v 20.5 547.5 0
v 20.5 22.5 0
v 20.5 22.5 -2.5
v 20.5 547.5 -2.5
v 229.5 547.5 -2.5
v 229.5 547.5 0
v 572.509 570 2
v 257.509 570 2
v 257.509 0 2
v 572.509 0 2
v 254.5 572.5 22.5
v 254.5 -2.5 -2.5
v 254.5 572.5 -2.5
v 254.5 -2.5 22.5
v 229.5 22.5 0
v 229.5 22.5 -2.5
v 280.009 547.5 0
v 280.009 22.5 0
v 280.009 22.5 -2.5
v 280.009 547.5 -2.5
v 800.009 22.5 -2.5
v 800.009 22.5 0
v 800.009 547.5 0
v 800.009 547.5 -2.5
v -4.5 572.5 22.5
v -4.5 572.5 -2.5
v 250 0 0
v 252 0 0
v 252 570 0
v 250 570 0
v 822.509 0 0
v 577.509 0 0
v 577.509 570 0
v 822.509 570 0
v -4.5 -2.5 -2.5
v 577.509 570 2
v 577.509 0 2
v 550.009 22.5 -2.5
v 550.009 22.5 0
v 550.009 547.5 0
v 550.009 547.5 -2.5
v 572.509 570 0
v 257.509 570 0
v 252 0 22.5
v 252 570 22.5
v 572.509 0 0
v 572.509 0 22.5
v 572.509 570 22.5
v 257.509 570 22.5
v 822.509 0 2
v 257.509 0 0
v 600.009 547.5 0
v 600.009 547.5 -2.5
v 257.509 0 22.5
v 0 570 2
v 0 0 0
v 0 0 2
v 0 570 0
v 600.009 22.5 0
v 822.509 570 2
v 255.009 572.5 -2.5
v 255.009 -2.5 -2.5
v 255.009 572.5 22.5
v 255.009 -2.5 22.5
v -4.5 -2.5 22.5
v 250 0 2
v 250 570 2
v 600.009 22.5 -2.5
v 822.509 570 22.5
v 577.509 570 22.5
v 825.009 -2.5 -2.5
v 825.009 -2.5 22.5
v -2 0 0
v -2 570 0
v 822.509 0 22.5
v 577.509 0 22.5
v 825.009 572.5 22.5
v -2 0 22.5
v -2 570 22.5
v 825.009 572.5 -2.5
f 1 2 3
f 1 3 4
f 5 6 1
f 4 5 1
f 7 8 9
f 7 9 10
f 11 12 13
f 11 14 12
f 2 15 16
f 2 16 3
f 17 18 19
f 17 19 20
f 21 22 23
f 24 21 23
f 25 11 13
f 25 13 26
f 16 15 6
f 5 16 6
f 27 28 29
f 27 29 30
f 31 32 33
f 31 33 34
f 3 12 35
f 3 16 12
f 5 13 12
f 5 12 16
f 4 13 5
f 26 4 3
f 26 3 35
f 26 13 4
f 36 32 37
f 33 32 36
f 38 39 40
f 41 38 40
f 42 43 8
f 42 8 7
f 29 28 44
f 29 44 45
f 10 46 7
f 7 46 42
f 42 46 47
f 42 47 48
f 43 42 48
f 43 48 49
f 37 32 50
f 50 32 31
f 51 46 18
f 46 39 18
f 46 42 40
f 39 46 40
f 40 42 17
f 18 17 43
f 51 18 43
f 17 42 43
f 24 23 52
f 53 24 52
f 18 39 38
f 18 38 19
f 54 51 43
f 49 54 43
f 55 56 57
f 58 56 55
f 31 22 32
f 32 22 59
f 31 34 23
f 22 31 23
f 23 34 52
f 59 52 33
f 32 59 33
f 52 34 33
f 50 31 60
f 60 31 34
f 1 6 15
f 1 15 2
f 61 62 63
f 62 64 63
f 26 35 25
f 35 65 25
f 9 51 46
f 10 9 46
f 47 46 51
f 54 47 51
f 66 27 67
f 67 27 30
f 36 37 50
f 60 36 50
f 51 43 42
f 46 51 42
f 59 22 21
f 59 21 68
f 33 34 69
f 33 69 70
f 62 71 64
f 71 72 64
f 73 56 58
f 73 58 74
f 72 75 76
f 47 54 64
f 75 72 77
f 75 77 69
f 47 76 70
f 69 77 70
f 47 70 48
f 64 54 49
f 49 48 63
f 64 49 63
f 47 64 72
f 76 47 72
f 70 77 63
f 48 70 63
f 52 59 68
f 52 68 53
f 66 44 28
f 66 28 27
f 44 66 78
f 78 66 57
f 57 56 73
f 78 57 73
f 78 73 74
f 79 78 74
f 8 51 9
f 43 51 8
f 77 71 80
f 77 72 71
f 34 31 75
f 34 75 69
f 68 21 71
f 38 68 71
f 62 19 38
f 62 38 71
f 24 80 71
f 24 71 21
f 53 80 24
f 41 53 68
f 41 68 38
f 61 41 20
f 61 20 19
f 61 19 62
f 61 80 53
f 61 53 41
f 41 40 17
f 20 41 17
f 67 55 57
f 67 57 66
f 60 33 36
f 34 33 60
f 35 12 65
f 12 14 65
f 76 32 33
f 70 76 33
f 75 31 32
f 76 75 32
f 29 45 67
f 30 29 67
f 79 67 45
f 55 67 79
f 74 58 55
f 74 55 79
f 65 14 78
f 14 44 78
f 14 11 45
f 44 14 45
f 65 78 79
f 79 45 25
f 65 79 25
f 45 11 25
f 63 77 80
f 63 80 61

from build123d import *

# Parameters (mm, degrees)
ESQUISSE1_W         = 250
ESQUISSE1_H         = 570
BOSS_EXTRU_2_DEPTH  = 2
ESQUISSE11_W        = 259
ESQUISSE11_H        = 575
ESQUISSE11_W_2      = 254
ESQUISSE11_H_2      = 570
BOSS_EXTRU_12_DEPTH = 22.5
ESQUISSE12_W        = 259
ESQUISSE12_H        = 575
ESQUISSE12_W_2      = 209
ESQUISSE12_H_2      = 525
BOSS_EXTRU_13_DEPTH = 2.5
ESQUISSE13_W        = 320
ESQUISSE13_H        = 575
ESQUISSE13_W_2      = 315
ESQUISSE13_H_2      = 570
BOSS_EXTRU_14_DEPTH = 22.5
ESQUISSE14_W        = 320
ESQUISSE14_H        = 575
ESQUISSE14_W_2      = 270
ESQUISSE14_H_2      = 525
BOSS_EXTRU_15_DEPTH = 2.5
ESQUISSE15_W        = 315
ESQUISSE15_H        = 570
BOSS_EXTRU_16_DEPTH = 2
ESQUISSE18_W        = 250
ESQUISSE18_H        = 575
ESQUISSE18_W_2      = 245
ESQUISSE18_H_2      = 570
BOSS_EXTRU_19_DEPTH = 22.5
ESQUISSE19_W        = 250
ESQUISSE19_H        = 575
ESQUISSE19_W_2      = 200
ESQUISSE19_H_2      = 525
BOSS_EXTRU_20_DEPTH = 2.5
ESQUISSE20_W        = 245
ESQUISSE20_H        = 570
BOSS_EXTRU_21_DEPTH = 2


with BuildPart() as part:
    # Esquisse1 → Boss.-Extru.2 (new body)
    with BuildSketch(Plane.XY):
        with Locations((125, 285)):
            Rectangle(ESQUISSE1_W, ESQUISSE1_H)
    extrude(amount=BOSS_EXTRU_2_DEPTH)



with BuildPart() as body_2:
    # Esquisse11 → Boss.-Extru.12 (new body)
    with BuildSketch(Plane(origin=(0, 0, 0), x_dir=(-1, 0, 0), z_dir=(0, 0, -1))):
        with Locations((-125, 285)):
            Rectangle(ESQUISSE11_W, ESQUISSE11_H)
        with Locations((-125, 285)):
            Rectangle(ESQUISSE11_W_2, ESQUISSE11_H_2, mode=Mode.SUBTRACT)
    extrude(amount=-BOSS_EXTRU_12_DEPTH)


with BuildPart() as part_1:
    add(part.part)

    add(body_2.part)  # Boss.-Extru.13 merges body 2
    # Esquisse12 → Boss.-Extru.13 (add)
    with BuildSketch(Plane(origin=(0, 0, 0), x_dir=(-1, 0, 0), z_dir=(0, 0, -1))):
        with Locations((-125, 285)):
            Rectangle(ESQUISSE12_W, ESQUISSE12_H)
        with Locations((-125, 285)):
            Rectangle(ESQUISSE12_W_2, ESQUISSE12_H_2, mode=Mode.SUBTRACT)
    extrude(amount=BOSS_EXTRU_13_DEPTH)


with BuildPart() as body_2_2:
    # Esquisse13 → Boss.-Extru.14 (new body)
    with BuildSketch(Plane(origin=(0, 0, 0), x_dir=(-1, 0, 0), z_dir=(0, 0, -1))):
        with Locations((-415.009332024, 285)):
            Rectangle(ESQUISSE13_W, ESQUISSE13_H)
        with Locations((-415.009332024, 285)):
            Rectangle(ESQUISSE13_W_2, ESQUISSE13_H_2, mode=Mode.SUBTRACT)
    extrude(amount=-BOSS_EXTRU_14_DEPTH)

    # Esquisse14 → Boss.-Extru.15 (add)
    with BuildSketch(Plane(origin=(0, 0, 0), x_dir=(-1, 0, 0), z_dir=(0, 0, -1))):
        with Locations((-415.009332024, 285)):
            Rectangle(ESQUISSE14_W, ESQUISSE14_H)
        with Locations((-415.009332024, 285)):
            Rectangle(ESQUISSE14_W_2, ESQUISSE14_H_2, mode=Mode.SUBTRACT)
    extrude(amount=BOSS_EXTRU_15_DEPTH)

    # Esquisse18 → Boss.-Extru.19 (add)
    with BuildSketch(Plane(origin=(0, 0, 0), x_dir=(-1, 0, 0), z_dir=(0, 0, -1))):
        with Locations((-700.009332024, 285)):
            Rectangle(ESQUISSE18_W, ESQUISSE18_H)
        with Locations((-700.009332024, 285)):
            Rectangle(ESQUISSE18_W_2, ESQUISSE18_H_2, mode=Mode.SUBTRACT)
    extrude(amount=-BOSS_EXTRU_19_DEPTH)

    # Esquisse19 → Boss.-Extru.20 (add)
    with BuildSketch(Plane(origin=(0, 0, 0), x_dir=(-1, 0, 0), z_dir=(0, 0, -1))):
        with Locations((-700.009332024, 285)):
            Rectangle(ESQUISSE19_W, ESQUISSE19_H)
        with Locations((-700.009332024, 285)):
            Rectangle(ESQUISSE19_W_2, ESQUISSE19_H_2, mode=Mode.SUBTRACT)
    extrude(amount=BOSS_EXTRU_20_DEPTH)


with BuildPart() as body_3:
    # Esquisse15 → Boss.-Extru.16 (new body)
    with BuildSketch(Plane.XY):
        with Locations((415.009332024, 285)):
            Rectangle(ESQUISSE15_W, ESQUISSE15_H)
    extrude(amount=BOSS_EXTRU_16_DEPTH)


with BuildPart() as body_4:
    # Esquisse20 → Boss.-Extru.21 (new body)
    with BuildSketch(Plane.XY):
        with Locations((700.009332024, 285)):
            Rectangle(ESQUISSE20_W, ESQUISSE20_H)
    extrude(amount=BOSS_EXTRU_21_DEPTH)


solid = Compound([part_1.part, body_2_2.part, body_3.part, body_4.part])
